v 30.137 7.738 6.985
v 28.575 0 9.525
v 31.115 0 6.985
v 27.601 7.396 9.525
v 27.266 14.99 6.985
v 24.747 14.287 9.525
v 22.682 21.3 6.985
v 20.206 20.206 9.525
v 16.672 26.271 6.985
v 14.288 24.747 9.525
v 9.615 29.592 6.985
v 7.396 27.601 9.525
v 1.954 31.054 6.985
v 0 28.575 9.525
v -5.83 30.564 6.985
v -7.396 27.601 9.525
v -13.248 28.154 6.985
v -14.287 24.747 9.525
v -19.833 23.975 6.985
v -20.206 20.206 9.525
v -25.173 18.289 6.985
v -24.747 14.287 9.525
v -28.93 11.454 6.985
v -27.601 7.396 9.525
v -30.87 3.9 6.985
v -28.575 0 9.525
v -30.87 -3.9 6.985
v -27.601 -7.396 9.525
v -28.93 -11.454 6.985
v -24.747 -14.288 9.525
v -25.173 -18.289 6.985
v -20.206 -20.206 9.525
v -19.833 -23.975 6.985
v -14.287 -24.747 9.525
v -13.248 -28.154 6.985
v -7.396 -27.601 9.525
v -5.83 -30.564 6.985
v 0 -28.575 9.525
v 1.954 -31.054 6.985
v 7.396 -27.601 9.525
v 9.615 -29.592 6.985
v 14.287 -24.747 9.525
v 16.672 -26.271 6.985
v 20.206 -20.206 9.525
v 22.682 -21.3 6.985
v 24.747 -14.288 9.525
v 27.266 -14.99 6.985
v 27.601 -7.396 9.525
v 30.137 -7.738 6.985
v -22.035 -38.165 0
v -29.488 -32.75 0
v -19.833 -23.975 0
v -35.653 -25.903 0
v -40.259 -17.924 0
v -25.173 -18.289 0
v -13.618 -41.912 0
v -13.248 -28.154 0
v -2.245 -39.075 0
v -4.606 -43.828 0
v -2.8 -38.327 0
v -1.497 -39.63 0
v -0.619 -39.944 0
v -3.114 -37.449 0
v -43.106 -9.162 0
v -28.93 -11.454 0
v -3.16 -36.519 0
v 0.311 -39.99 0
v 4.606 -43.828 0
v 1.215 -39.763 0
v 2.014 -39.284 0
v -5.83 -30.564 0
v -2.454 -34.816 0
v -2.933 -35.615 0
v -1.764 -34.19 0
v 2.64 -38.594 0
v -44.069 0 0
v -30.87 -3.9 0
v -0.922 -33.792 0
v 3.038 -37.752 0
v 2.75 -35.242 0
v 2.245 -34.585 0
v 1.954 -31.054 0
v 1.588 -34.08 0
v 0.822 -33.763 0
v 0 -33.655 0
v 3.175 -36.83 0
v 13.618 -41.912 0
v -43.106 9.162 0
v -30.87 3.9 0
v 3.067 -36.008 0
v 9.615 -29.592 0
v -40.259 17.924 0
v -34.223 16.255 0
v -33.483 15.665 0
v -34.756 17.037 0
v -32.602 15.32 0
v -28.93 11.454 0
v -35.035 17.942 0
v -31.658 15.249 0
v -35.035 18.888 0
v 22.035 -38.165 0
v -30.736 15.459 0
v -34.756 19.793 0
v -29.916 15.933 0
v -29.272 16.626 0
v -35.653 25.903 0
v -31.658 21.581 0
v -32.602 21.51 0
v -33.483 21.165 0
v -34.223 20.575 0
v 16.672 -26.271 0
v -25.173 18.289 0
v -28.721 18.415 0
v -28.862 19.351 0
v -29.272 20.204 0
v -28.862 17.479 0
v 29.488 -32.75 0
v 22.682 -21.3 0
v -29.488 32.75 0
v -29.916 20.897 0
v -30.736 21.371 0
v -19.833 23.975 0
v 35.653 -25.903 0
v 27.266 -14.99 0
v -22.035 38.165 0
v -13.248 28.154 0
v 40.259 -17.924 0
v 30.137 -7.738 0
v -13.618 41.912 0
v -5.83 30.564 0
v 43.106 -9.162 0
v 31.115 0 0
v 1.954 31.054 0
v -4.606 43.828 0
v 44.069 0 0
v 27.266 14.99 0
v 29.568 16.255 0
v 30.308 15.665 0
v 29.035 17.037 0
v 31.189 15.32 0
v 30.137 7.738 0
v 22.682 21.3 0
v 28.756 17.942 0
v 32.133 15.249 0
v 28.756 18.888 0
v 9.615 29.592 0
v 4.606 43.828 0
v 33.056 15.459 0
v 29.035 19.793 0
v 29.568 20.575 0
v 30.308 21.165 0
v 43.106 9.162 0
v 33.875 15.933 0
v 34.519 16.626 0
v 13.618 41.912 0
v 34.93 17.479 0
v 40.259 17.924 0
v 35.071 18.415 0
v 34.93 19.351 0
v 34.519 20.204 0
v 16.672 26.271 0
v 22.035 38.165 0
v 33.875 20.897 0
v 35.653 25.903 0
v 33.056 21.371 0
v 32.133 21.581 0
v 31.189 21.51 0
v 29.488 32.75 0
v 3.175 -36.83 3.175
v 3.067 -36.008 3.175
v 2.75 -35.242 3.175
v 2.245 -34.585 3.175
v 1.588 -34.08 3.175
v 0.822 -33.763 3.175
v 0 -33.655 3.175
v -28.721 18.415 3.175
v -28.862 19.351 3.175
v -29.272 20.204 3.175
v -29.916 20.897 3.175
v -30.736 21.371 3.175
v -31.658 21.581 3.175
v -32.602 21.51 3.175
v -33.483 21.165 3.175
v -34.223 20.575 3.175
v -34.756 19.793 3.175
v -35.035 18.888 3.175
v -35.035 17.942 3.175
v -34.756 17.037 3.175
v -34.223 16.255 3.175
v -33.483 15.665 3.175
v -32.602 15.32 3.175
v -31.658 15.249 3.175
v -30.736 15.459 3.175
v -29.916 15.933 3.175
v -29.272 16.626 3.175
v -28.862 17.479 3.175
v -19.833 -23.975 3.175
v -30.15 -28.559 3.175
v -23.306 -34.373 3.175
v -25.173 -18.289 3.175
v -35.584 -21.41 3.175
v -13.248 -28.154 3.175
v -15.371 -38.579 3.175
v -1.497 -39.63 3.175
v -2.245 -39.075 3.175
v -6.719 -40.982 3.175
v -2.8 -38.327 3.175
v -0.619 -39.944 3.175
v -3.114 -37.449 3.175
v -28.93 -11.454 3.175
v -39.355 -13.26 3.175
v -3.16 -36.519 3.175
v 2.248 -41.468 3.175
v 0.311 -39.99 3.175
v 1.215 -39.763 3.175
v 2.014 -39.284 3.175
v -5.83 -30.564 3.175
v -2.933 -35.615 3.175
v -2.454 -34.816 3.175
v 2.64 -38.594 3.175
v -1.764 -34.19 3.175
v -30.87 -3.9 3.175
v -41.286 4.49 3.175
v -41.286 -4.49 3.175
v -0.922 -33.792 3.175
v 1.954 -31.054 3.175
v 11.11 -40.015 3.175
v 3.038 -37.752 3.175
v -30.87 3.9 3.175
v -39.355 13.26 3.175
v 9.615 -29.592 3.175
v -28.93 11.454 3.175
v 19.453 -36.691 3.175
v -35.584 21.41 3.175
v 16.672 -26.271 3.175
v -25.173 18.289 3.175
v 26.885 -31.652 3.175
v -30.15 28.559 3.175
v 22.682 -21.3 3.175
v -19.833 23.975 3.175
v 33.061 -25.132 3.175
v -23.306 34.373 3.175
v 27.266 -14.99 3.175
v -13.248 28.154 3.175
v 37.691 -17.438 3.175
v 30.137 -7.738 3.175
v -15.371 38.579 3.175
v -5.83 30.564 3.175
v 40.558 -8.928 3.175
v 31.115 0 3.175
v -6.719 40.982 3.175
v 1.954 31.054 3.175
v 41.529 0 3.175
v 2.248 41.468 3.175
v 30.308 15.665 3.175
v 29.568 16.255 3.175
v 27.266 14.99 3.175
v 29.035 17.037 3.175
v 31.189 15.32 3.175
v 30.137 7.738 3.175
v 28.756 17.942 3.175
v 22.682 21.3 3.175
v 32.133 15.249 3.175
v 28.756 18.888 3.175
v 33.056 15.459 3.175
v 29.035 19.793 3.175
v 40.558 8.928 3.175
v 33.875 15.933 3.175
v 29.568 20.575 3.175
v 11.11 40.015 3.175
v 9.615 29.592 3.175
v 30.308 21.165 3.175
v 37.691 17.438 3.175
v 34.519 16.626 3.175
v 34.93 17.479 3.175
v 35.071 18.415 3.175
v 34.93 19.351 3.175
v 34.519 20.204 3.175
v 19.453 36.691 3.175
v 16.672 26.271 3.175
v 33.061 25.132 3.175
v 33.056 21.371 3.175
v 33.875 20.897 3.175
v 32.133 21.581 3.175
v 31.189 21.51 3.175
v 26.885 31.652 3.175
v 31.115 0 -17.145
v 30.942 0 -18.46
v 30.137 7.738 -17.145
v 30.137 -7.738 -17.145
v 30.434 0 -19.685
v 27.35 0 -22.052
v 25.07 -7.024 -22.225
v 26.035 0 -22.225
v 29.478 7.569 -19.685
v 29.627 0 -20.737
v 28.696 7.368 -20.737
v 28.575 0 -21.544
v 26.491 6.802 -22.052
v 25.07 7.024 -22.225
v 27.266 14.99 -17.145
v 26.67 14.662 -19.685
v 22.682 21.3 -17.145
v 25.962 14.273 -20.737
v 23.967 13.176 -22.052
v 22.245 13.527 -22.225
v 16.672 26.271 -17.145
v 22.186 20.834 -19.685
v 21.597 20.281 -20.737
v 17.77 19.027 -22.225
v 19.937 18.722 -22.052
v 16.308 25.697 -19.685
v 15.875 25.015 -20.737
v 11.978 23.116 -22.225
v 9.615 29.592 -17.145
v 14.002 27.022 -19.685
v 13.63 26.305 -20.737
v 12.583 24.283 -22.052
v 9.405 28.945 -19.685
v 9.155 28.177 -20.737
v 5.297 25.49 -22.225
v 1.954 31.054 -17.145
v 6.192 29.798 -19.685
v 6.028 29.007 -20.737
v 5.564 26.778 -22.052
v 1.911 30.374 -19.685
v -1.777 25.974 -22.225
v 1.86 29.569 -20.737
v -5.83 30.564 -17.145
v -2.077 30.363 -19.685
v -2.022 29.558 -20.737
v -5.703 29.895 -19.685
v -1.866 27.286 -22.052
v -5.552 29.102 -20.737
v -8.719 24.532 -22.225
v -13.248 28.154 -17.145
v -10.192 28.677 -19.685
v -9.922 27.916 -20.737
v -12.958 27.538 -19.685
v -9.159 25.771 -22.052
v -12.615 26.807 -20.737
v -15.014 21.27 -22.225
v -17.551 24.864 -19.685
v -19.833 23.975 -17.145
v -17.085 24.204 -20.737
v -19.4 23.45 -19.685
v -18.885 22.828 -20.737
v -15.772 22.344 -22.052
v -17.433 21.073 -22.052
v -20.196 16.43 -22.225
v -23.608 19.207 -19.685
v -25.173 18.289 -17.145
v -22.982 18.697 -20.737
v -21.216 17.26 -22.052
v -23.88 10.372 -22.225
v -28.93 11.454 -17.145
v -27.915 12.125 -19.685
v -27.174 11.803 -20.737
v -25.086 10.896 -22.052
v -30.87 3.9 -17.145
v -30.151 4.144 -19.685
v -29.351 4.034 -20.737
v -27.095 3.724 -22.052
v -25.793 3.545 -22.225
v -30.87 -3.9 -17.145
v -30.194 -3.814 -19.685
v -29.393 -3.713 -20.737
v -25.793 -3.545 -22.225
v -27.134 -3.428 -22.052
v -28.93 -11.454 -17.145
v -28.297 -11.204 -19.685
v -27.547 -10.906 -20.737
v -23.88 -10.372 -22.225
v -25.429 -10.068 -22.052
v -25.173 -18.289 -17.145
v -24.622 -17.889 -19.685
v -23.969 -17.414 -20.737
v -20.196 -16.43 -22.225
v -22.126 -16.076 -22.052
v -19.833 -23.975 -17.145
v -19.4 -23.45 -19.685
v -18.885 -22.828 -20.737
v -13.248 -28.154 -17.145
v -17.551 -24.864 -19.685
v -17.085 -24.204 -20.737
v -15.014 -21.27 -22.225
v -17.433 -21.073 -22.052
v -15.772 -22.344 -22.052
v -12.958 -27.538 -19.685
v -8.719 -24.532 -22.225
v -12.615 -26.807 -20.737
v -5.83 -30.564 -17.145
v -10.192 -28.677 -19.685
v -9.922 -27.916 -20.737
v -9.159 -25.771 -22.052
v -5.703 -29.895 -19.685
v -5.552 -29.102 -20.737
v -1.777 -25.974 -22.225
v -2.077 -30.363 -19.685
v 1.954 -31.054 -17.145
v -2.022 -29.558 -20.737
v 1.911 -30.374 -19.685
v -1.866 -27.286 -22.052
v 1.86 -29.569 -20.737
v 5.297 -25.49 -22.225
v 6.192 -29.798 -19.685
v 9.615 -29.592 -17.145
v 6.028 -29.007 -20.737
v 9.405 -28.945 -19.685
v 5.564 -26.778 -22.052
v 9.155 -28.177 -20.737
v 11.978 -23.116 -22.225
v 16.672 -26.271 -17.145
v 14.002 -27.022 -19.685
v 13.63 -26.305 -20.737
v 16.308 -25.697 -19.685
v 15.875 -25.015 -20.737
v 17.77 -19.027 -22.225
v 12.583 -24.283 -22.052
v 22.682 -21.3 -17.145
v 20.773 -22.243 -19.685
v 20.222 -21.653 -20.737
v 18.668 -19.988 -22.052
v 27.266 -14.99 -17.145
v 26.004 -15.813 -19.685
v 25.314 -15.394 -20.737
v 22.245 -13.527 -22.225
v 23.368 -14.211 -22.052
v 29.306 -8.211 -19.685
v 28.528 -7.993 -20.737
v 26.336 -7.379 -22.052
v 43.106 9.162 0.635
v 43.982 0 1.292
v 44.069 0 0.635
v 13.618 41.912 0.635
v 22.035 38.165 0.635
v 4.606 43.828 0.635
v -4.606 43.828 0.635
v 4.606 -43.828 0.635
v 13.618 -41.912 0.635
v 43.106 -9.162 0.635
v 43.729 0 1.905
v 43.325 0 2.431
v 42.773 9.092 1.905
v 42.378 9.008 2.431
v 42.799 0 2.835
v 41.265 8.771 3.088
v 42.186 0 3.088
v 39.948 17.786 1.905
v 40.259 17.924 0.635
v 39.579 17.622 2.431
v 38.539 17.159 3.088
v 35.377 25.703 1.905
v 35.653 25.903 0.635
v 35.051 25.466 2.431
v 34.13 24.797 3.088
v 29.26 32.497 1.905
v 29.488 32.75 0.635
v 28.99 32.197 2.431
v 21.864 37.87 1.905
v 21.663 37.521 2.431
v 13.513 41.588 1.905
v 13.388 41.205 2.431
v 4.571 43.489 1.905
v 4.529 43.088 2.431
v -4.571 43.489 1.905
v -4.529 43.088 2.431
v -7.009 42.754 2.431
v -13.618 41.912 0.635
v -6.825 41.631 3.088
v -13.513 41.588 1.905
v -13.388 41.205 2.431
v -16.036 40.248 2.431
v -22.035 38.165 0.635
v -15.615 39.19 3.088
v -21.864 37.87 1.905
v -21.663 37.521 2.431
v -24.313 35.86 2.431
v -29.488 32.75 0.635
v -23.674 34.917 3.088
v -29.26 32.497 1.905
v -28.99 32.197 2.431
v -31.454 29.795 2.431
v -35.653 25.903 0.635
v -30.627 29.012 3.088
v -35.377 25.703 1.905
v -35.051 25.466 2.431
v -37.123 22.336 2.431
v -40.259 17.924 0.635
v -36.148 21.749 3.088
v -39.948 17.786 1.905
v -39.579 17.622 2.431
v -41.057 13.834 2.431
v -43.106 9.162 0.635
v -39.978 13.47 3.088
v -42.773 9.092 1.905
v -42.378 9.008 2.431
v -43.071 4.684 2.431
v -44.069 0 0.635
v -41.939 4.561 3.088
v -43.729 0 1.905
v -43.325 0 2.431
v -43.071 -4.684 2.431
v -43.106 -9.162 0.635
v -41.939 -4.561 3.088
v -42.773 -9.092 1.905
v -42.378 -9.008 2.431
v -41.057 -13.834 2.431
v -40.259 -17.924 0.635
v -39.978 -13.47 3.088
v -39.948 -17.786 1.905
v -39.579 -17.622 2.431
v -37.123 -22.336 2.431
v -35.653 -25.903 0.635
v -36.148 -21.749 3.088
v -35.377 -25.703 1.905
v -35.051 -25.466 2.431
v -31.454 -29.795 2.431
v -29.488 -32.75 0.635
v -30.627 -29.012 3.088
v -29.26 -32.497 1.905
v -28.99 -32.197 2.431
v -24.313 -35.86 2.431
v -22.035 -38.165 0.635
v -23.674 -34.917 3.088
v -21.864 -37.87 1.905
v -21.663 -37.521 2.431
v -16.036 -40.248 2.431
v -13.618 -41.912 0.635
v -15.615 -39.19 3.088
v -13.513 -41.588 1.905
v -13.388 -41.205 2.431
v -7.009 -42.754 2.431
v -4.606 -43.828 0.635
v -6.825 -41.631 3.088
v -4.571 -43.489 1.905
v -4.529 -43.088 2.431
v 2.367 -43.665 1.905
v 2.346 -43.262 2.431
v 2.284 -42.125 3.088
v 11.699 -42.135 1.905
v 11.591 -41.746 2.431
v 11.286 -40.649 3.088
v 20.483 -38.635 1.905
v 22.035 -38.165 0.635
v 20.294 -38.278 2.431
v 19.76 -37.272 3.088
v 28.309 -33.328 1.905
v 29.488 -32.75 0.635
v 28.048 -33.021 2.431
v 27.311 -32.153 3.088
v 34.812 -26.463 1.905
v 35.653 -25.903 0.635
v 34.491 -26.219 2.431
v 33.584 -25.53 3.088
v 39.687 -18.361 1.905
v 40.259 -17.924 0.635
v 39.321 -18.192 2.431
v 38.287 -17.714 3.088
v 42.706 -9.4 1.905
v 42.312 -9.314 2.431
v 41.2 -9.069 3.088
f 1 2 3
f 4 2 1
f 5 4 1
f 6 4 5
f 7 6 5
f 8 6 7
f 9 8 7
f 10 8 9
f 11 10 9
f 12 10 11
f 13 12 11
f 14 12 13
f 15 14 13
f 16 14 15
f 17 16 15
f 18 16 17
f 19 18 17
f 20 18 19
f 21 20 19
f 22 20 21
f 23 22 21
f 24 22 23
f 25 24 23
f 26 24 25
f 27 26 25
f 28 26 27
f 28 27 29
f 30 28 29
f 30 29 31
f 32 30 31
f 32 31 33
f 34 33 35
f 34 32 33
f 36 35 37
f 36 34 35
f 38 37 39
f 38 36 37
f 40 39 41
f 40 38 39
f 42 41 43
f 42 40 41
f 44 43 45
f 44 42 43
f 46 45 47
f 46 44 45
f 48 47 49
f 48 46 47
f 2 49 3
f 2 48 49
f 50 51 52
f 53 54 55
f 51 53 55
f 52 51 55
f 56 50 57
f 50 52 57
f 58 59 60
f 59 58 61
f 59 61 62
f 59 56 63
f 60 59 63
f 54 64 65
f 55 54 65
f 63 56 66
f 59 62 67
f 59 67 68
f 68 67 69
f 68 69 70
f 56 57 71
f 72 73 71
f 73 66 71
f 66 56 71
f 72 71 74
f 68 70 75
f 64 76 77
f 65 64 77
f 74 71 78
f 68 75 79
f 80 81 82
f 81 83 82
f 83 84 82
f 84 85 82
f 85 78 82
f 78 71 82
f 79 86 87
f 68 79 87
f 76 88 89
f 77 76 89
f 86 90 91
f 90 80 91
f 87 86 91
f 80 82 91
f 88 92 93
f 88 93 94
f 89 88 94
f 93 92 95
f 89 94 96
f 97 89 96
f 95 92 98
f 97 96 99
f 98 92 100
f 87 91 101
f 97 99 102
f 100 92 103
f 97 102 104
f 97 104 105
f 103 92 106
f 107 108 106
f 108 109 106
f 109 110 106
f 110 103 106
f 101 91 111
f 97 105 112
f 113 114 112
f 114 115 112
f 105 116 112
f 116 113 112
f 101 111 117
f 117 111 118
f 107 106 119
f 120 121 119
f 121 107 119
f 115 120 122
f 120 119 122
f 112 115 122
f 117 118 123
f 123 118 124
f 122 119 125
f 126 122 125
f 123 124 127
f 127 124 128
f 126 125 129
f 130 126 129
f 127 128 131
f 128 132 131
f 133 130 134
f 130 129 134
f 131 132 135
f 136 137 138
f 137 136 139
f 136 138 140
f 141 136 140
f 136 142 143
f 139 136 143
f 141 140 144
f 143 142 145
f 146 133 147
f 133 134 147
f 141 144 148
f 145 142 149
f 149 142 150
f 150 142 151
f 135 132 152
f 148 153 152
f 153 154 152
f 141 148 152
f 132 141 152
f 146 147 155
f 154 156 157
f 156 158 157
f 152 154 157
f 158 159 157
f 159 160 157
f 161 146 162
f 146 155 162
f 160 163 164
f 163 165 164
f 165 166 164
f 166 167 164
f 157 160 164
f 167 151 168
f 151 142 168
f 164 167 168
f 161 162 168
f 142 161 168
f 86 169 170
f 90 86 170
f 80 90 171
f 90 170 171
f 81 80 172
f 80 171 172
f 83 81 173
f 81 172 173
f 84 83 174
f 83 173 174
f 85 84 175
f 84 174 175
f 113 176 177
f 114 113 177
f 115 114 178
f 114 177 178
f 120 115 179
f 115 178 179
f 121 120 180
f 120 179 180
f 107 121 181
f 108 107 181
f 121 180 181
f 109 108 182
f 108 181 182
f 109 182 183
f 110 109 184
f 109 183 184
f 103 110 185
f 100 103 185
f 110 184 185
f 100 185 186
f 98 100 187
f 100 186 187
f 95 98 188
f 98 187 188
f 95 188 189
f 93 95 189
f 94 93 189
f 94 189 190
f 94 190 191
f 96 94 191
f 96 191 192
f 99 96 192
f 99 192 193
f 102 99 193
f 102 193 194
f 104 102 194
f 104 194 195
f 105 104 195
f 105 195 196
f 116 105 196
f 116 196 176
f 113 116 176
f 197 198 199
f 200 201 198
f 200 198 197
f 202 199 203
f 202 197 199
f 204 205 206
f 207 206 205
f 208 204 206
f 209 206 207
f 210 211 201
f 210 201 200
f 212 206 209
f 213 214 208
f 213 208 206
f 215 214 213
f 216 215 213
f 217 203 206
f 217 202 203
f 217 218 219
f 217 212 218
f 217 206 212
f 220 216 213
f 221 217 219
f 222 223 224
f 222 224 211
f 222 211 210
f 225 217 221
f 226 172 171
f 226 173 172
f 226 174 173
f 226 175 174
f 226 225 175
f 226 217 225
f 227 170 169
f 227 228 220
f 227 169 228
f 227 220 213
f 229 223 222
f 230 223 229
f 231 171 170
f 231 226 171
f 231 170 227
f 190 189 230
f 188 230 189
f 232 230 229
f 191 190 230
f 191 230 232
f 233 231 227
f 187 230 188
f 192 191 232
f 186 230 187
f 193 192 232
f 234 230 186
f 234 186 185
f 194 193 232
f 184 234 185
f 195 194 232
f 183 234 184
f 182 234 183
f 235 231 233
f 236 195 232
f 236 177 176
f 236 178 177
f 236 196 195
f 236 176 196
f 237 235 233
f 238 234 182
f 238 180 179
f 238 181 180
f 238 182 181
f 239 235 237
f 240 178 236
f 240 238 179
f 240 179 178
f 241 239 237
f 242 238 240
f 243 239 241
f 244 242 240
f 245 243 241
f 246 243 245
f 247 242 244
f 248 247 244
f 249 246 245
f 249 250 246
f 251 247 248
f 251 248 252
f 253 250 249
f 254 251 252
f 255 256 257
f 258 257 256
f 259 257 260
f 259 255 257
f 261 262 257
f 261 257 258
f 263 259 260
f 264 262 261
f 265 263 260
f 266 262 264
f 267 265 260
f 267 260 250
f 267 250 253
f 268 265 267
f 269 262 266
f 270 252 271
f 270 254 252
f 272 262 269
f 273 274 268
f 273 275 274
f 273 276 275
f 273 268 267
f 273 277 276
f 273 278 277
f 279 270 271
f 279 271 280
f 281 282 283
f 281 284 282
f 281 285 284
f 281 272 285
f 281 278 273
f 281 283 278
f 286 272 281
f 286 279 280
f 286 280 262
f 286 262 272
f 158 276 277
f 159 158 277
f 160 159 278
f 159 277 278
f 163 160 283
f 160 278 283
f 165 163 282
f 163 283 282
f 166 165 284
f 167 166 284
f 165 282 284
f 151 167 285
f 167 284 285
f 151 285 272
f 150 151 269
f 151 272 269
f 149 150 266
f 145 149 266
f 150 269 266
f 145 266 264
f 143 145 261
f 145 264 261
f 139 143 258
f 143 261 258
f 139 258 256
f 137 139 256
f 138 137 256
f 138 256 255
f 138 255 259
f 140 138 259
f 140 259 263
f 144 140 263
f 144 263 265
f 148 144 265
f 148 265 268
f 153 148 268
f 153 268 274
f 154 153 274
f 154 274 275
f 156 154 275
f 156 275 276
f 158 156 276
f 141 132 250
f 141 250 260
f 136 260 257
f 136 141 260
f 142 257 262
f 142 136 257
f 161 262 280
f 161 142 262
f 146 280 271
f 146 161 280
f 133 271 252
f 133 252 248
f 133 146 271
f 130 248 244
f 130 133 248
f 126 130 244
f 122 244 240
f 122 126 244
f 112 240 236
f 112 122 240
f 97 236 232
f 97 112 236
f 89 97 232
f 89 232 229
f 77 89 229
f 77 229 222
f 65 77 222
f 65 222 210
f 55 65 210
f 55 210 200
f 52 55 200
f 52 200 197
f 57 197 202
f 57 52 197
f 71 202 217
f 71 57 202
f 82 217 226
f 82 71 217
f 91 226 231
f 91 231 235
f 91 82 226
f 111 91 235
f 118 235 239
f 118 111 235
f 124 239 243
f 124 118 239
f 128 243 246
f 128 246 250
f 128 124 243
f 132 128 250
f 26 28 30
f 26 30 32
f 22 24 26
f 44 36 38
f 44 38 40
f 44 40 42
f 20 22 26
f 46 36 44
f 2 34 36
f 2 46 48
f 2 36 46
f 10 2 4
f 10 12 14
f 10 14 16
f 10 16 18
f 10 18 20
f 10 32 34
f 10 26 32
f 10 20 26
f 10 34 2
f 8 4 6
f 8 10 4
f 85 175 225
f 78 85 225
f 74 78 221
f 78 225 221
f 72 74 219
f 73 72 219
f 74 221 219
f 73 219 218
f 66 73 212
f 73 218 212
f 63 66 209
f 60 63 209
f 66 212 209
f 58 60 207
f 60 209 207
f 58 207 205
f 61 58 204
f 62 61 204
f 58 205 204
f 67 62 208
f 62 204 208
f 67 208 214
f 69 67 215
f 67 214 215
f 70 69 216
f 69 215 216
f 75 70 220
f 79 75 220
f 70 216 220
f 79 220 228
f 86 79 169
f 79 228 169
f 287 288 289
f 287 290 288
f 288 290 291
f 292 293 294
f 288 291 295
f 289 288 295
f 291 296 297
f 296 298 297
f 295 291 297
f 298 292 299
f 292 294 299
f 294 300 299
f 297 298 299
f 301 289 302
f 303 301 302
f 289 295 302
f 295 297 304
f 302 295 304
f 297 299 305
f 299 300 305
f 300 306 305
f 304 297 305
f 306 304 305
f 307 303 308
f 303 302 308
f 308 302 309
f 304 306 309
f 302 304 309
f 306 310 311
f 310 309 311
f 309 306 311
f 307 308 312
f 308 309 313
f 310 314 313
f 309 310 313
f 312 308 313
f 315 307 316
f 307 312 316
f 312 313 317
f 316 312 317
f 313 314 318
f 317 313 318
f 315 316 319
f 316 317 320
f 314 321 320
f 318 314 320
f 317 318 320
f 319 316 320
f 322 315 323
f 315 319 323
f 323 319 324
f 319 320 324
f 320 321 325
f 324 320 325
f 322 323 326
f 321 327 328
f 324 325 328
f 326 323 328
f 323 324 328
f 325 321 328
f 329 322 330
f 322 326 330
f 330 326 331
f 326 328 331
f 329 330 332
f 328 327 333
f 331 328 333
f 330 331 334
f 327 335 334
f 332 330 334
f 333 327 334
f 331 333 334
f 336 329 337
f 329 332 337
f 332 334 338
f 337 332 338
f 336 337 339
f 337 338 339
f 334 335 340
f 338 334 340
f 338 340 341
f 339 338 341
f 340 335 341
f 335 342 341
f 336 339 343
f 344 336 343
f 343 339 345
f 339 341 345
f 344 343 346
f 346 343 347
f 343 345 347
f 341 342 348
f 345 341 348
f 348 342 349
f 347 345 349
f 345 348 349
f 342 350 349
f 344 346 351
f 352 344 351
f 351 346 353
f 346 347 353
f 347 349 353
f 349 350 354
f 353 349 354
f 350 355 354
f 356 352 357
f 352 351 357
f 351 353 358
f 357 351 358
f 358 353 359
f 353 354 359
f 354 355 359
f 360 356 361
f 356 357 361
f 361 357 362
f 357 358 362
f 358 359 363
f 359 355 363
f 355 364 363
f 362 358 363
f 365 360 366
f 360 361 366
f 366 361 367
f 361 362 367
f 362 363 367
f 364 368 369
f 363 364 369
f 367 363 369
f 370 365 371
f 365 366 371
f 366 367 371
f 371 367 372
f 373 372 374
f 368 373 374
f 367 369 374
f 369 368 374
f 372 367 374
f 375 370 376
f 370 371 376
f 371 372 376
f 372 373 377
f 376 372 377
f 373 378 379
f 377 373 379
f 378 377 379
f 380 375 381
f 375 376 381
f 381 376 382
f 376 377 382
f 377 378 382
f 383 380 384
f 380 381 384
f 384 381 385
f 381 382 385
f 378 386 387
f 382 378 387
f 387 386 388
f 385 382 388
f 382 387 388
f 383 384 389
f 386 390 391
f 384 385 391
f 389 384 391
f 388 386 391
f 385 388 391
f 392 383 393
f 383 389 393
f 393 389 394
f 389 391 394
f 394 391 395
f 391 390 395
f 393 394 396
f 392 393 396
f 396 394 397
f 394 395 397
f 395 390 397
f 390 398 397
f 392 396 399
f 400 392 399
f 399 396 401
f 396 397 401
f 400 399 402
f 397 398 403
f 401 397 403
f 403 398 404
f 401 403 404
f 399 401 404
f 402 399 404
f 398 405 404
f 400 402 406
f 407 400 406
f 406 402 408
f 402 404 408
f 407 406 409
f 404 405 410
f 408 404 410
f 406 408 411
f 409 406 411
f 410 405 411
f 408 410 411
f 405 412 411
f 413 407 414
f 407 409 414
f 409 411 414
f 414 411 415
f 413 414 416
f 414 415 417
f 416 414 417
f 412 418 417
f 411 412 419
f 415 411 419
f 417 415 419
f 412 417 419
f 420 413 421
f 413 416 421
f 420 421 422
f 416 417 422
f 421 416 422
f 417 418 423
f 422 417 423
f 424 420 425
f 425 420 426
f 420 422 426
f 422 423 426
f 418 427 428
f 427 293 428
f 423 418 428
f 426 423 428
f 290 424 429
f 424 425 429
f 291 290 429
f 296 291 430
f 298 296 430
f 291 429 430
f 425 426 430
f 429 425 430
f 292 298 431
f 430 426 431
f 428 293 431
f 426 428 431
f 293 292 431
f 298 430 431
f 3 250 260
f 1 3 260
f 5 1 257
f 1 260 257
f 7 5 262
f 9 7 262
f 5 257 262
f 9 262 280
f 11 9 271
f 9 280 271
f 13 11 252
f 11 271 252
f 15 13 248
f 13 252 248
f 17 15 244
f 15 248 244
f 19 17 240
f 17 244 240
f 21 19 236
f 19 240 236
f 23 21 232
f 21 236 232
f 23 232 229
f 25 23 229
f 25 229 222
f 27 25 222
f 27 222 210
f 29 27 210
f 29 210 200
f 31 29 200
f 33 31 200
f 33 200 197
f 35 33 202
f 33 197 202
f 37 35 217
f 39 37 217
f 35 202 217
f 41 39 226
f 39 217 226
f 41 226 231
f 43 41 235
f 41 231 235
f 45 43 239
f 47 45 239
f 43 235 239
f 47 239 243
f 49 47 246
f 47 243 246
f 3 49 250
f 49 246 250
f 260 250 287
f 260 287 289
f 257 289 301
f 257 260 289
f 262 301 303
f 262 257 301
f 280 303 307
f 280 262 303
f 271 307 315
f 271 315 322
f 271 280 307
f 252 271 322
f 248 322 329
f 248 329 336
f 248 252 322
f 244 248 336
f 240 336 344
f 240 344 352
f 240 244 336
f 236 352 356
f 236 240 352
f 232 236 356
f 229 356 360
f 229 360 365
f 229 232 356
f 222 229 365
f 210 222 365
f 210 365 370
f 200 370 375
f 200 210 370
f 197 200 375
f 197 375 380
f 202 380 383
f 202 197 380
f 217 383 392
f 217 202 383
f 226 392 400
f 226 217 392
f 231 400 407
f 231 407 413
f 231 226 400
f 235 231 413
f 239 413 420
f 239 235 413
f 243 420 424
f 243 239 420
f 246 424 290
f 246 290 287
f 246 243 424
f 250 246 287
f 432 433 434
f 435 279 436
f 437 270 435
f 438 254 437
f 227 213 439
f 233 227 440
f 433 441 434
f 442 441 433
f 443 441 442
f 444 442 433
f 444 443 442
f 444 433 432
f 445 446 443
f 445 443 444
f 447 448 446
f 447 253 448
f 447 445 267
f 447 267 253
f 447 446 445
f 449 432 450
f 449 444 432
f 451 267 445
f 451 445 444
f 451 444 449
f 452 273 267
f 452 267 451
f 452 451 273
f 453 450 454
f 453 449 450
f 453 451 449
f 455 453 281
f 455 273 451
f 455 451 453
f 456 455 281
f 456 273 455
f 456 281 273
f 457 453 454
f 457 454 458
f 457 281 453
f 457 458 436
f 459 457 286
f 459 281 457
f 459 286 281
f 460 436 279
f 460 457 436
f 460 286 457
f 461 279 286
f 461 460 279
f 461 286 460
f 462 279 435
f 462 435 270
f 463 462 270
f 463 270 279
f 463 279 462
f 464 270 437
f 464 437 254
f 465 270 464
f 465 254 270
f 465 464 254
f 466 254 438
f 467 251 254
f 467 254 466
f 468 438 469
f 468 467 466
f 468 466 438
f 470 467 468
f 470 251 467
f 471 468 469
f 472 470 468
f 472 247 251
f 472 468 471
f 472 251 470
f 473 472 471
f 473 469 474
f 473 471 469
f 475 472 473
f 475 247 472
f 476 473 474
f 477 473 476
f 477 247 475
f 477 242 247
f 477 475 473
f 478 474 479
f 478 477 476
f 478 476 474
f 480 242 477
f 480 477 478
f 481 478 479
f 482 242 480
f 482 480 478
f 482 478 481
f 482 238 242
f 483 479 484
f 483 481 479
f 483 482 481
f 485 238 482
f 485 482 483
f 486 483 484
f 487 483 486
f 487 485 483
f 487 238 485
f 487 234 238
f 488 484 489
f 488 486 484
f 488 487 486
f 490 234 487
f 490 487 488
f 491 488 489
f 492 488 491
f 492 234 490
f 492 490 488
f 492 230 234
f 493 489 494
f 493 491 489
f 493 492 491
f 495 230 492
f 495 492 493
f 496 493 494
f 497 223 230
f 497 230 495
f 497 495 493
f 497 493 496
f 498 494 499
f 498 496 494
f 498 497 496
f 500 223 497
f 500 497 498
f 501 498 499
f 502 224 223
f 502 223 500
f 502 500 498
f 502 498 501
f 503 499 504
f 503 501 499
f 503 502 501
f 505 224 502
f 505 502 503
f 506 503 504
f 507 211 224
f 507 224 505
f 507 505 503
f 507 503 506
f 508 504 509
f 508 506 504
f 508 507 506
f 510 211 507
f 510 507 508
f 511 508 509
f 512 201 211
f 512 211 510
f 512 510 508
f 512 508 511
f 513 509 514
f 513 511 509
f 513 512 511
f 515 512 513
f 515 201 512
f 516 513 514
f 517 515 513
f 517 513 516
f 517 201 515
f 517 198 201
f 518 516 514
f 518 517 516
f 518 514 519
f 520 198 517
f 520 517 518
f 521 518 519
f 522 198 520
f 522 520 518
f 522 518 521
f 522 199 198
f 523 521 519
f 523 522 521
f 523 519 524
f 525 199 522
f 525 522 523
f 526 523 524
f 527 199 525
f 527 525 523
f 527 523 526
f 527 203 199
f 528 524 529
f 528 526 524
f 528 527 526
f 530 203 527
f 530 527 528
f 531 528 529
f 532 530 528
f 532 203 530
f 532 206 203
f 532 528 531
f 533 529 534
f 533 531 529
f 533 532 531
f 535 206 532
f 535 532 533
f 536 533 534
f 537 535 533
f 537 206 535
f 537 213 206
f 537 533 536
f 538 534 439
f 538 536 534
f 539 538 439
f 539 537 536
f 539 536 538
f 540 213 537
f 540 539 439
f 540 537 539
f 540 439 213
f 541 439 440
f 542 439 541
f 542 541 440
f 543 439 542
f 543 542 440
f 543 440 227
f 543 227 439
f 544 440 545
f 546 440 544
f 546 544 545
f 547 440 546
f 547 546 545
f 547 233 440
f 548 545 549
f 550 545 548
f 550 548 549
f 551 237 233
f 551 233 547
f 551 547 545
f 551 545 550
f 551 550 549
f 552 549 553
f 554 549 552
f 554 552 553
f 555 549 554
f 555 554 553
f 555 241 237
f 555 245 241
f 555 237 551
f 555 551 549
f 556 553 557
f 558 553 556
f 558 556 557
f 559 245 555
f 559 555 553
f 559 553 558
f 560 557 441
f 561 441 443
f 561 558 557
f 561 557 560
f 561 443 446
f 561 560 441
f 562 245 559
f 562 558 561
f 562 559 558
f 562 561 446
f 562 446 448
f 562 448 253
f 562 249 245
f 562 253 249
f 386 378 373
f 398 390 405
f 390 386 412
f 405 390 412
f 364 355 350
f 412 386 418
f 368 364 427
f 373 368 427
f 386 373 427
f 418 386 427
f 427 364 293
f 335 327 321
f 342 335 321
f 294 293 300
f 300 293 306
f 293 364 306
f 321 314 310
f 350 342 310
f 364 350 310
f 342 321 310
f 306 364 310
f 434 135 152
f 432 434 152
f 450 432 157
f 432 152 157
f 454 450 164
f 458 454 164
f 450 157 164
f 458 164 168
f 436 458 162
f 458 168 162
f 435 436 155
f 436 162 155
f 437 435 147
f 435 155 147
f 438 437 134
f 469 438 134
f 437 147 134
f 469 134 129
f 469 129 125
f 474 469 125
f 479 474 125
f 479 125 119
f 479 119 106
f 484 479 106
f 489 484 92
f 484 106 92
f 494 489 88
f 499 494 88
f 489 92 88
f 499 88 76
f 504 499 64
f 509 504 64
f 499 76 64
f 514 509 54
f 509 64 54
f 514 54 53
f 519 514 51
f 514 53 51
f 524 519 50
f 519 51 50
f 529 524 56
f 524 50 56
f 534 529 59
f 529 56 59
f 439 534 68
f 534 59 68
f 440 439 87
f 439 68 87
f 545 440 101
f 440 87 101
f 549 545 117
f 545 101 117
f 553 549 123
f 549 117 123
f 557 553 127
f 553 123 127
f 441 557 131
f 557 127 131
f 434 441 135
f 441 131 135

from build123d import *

# Parameters (mm, degrees)
F0_R     = 44.069
F0_R_2   = 31.115
F1_DEPTH = 3.175
F2_R     = 2.54
F3_R     = 3.175
F4_DEPTH = 25.4
F5_R     = 31.115
F6_DEPTH = 25.4
F7_R     = 5.08
F8_DEPTH = 6.35
F9_SIZE  = 2.54


with BuildPart() as f1:
    # F0 (on Top) → F1 (new body)
    with BuildSketch(Plane.XY):
        Circle(F0_R)
        Circle(F0_R_2, mode=Mode.SUBTRACT)
    extrude(amount=F1_DEPTH)

    # F2
    f2_edges = [f1.edges().sort_by_distance(p)[0] for p in [
        (-44.069, 0, 3.175),
    ]]
    fillet(f2_edges, radius=F2_R)

    # F3 (on face) → F4 (cut)
    with BuildSketch(Plane.XY.offset(3.175)):
        with Locations((-31.8957156214, 18.415)):
            Circle(F3_R)
        with Locations((31.8957156214, 18.415)):
            Circle(F3_R)
        with BuildLine():
            ThreePointArc((3.175, -36.83), (2.2450640303, -34.5849359697), (0, -33.655))
            ThreePointArc((0, -33.655), (-2.2450640303, -39.0750640303), (3.175, -36.83))
        make_face()
    extrude(amount=-F4_DEPTH, mode=Mode.SUBTRACT)


with BuildPart() as f6:
    # F5 (on face) → F6 (new body)
    with BuildSketch(Plane.XY.offset(3.175)):
        Circle(F5_R)
    extrude(amount=-F6_DEPTH)

    # F7
    f7_edges = [f6.edges().sort_by_distance(p)[0] for p in [
        (-31.115, 0, -22.225),
    ]]
    fillet(f7_edges, radius=F7_R)

    # F8 (add): a face of the model
    f8_faces = [f6.faces().sort_by_distance(p)[0] for p in [
        (0, 0, 3.175),
    ]]
    extrude(f8_faces, amount=F8_DEPTH)

    # F9
    f9_edges = [f6.edges().sort_by_distance(p)[0] for p in [
        (-31.115, 0, 9.525),
    ]]
    chamfer(f9_edges, length=F9_SIZE)


solid = Compound([f1.part, f6.part])
